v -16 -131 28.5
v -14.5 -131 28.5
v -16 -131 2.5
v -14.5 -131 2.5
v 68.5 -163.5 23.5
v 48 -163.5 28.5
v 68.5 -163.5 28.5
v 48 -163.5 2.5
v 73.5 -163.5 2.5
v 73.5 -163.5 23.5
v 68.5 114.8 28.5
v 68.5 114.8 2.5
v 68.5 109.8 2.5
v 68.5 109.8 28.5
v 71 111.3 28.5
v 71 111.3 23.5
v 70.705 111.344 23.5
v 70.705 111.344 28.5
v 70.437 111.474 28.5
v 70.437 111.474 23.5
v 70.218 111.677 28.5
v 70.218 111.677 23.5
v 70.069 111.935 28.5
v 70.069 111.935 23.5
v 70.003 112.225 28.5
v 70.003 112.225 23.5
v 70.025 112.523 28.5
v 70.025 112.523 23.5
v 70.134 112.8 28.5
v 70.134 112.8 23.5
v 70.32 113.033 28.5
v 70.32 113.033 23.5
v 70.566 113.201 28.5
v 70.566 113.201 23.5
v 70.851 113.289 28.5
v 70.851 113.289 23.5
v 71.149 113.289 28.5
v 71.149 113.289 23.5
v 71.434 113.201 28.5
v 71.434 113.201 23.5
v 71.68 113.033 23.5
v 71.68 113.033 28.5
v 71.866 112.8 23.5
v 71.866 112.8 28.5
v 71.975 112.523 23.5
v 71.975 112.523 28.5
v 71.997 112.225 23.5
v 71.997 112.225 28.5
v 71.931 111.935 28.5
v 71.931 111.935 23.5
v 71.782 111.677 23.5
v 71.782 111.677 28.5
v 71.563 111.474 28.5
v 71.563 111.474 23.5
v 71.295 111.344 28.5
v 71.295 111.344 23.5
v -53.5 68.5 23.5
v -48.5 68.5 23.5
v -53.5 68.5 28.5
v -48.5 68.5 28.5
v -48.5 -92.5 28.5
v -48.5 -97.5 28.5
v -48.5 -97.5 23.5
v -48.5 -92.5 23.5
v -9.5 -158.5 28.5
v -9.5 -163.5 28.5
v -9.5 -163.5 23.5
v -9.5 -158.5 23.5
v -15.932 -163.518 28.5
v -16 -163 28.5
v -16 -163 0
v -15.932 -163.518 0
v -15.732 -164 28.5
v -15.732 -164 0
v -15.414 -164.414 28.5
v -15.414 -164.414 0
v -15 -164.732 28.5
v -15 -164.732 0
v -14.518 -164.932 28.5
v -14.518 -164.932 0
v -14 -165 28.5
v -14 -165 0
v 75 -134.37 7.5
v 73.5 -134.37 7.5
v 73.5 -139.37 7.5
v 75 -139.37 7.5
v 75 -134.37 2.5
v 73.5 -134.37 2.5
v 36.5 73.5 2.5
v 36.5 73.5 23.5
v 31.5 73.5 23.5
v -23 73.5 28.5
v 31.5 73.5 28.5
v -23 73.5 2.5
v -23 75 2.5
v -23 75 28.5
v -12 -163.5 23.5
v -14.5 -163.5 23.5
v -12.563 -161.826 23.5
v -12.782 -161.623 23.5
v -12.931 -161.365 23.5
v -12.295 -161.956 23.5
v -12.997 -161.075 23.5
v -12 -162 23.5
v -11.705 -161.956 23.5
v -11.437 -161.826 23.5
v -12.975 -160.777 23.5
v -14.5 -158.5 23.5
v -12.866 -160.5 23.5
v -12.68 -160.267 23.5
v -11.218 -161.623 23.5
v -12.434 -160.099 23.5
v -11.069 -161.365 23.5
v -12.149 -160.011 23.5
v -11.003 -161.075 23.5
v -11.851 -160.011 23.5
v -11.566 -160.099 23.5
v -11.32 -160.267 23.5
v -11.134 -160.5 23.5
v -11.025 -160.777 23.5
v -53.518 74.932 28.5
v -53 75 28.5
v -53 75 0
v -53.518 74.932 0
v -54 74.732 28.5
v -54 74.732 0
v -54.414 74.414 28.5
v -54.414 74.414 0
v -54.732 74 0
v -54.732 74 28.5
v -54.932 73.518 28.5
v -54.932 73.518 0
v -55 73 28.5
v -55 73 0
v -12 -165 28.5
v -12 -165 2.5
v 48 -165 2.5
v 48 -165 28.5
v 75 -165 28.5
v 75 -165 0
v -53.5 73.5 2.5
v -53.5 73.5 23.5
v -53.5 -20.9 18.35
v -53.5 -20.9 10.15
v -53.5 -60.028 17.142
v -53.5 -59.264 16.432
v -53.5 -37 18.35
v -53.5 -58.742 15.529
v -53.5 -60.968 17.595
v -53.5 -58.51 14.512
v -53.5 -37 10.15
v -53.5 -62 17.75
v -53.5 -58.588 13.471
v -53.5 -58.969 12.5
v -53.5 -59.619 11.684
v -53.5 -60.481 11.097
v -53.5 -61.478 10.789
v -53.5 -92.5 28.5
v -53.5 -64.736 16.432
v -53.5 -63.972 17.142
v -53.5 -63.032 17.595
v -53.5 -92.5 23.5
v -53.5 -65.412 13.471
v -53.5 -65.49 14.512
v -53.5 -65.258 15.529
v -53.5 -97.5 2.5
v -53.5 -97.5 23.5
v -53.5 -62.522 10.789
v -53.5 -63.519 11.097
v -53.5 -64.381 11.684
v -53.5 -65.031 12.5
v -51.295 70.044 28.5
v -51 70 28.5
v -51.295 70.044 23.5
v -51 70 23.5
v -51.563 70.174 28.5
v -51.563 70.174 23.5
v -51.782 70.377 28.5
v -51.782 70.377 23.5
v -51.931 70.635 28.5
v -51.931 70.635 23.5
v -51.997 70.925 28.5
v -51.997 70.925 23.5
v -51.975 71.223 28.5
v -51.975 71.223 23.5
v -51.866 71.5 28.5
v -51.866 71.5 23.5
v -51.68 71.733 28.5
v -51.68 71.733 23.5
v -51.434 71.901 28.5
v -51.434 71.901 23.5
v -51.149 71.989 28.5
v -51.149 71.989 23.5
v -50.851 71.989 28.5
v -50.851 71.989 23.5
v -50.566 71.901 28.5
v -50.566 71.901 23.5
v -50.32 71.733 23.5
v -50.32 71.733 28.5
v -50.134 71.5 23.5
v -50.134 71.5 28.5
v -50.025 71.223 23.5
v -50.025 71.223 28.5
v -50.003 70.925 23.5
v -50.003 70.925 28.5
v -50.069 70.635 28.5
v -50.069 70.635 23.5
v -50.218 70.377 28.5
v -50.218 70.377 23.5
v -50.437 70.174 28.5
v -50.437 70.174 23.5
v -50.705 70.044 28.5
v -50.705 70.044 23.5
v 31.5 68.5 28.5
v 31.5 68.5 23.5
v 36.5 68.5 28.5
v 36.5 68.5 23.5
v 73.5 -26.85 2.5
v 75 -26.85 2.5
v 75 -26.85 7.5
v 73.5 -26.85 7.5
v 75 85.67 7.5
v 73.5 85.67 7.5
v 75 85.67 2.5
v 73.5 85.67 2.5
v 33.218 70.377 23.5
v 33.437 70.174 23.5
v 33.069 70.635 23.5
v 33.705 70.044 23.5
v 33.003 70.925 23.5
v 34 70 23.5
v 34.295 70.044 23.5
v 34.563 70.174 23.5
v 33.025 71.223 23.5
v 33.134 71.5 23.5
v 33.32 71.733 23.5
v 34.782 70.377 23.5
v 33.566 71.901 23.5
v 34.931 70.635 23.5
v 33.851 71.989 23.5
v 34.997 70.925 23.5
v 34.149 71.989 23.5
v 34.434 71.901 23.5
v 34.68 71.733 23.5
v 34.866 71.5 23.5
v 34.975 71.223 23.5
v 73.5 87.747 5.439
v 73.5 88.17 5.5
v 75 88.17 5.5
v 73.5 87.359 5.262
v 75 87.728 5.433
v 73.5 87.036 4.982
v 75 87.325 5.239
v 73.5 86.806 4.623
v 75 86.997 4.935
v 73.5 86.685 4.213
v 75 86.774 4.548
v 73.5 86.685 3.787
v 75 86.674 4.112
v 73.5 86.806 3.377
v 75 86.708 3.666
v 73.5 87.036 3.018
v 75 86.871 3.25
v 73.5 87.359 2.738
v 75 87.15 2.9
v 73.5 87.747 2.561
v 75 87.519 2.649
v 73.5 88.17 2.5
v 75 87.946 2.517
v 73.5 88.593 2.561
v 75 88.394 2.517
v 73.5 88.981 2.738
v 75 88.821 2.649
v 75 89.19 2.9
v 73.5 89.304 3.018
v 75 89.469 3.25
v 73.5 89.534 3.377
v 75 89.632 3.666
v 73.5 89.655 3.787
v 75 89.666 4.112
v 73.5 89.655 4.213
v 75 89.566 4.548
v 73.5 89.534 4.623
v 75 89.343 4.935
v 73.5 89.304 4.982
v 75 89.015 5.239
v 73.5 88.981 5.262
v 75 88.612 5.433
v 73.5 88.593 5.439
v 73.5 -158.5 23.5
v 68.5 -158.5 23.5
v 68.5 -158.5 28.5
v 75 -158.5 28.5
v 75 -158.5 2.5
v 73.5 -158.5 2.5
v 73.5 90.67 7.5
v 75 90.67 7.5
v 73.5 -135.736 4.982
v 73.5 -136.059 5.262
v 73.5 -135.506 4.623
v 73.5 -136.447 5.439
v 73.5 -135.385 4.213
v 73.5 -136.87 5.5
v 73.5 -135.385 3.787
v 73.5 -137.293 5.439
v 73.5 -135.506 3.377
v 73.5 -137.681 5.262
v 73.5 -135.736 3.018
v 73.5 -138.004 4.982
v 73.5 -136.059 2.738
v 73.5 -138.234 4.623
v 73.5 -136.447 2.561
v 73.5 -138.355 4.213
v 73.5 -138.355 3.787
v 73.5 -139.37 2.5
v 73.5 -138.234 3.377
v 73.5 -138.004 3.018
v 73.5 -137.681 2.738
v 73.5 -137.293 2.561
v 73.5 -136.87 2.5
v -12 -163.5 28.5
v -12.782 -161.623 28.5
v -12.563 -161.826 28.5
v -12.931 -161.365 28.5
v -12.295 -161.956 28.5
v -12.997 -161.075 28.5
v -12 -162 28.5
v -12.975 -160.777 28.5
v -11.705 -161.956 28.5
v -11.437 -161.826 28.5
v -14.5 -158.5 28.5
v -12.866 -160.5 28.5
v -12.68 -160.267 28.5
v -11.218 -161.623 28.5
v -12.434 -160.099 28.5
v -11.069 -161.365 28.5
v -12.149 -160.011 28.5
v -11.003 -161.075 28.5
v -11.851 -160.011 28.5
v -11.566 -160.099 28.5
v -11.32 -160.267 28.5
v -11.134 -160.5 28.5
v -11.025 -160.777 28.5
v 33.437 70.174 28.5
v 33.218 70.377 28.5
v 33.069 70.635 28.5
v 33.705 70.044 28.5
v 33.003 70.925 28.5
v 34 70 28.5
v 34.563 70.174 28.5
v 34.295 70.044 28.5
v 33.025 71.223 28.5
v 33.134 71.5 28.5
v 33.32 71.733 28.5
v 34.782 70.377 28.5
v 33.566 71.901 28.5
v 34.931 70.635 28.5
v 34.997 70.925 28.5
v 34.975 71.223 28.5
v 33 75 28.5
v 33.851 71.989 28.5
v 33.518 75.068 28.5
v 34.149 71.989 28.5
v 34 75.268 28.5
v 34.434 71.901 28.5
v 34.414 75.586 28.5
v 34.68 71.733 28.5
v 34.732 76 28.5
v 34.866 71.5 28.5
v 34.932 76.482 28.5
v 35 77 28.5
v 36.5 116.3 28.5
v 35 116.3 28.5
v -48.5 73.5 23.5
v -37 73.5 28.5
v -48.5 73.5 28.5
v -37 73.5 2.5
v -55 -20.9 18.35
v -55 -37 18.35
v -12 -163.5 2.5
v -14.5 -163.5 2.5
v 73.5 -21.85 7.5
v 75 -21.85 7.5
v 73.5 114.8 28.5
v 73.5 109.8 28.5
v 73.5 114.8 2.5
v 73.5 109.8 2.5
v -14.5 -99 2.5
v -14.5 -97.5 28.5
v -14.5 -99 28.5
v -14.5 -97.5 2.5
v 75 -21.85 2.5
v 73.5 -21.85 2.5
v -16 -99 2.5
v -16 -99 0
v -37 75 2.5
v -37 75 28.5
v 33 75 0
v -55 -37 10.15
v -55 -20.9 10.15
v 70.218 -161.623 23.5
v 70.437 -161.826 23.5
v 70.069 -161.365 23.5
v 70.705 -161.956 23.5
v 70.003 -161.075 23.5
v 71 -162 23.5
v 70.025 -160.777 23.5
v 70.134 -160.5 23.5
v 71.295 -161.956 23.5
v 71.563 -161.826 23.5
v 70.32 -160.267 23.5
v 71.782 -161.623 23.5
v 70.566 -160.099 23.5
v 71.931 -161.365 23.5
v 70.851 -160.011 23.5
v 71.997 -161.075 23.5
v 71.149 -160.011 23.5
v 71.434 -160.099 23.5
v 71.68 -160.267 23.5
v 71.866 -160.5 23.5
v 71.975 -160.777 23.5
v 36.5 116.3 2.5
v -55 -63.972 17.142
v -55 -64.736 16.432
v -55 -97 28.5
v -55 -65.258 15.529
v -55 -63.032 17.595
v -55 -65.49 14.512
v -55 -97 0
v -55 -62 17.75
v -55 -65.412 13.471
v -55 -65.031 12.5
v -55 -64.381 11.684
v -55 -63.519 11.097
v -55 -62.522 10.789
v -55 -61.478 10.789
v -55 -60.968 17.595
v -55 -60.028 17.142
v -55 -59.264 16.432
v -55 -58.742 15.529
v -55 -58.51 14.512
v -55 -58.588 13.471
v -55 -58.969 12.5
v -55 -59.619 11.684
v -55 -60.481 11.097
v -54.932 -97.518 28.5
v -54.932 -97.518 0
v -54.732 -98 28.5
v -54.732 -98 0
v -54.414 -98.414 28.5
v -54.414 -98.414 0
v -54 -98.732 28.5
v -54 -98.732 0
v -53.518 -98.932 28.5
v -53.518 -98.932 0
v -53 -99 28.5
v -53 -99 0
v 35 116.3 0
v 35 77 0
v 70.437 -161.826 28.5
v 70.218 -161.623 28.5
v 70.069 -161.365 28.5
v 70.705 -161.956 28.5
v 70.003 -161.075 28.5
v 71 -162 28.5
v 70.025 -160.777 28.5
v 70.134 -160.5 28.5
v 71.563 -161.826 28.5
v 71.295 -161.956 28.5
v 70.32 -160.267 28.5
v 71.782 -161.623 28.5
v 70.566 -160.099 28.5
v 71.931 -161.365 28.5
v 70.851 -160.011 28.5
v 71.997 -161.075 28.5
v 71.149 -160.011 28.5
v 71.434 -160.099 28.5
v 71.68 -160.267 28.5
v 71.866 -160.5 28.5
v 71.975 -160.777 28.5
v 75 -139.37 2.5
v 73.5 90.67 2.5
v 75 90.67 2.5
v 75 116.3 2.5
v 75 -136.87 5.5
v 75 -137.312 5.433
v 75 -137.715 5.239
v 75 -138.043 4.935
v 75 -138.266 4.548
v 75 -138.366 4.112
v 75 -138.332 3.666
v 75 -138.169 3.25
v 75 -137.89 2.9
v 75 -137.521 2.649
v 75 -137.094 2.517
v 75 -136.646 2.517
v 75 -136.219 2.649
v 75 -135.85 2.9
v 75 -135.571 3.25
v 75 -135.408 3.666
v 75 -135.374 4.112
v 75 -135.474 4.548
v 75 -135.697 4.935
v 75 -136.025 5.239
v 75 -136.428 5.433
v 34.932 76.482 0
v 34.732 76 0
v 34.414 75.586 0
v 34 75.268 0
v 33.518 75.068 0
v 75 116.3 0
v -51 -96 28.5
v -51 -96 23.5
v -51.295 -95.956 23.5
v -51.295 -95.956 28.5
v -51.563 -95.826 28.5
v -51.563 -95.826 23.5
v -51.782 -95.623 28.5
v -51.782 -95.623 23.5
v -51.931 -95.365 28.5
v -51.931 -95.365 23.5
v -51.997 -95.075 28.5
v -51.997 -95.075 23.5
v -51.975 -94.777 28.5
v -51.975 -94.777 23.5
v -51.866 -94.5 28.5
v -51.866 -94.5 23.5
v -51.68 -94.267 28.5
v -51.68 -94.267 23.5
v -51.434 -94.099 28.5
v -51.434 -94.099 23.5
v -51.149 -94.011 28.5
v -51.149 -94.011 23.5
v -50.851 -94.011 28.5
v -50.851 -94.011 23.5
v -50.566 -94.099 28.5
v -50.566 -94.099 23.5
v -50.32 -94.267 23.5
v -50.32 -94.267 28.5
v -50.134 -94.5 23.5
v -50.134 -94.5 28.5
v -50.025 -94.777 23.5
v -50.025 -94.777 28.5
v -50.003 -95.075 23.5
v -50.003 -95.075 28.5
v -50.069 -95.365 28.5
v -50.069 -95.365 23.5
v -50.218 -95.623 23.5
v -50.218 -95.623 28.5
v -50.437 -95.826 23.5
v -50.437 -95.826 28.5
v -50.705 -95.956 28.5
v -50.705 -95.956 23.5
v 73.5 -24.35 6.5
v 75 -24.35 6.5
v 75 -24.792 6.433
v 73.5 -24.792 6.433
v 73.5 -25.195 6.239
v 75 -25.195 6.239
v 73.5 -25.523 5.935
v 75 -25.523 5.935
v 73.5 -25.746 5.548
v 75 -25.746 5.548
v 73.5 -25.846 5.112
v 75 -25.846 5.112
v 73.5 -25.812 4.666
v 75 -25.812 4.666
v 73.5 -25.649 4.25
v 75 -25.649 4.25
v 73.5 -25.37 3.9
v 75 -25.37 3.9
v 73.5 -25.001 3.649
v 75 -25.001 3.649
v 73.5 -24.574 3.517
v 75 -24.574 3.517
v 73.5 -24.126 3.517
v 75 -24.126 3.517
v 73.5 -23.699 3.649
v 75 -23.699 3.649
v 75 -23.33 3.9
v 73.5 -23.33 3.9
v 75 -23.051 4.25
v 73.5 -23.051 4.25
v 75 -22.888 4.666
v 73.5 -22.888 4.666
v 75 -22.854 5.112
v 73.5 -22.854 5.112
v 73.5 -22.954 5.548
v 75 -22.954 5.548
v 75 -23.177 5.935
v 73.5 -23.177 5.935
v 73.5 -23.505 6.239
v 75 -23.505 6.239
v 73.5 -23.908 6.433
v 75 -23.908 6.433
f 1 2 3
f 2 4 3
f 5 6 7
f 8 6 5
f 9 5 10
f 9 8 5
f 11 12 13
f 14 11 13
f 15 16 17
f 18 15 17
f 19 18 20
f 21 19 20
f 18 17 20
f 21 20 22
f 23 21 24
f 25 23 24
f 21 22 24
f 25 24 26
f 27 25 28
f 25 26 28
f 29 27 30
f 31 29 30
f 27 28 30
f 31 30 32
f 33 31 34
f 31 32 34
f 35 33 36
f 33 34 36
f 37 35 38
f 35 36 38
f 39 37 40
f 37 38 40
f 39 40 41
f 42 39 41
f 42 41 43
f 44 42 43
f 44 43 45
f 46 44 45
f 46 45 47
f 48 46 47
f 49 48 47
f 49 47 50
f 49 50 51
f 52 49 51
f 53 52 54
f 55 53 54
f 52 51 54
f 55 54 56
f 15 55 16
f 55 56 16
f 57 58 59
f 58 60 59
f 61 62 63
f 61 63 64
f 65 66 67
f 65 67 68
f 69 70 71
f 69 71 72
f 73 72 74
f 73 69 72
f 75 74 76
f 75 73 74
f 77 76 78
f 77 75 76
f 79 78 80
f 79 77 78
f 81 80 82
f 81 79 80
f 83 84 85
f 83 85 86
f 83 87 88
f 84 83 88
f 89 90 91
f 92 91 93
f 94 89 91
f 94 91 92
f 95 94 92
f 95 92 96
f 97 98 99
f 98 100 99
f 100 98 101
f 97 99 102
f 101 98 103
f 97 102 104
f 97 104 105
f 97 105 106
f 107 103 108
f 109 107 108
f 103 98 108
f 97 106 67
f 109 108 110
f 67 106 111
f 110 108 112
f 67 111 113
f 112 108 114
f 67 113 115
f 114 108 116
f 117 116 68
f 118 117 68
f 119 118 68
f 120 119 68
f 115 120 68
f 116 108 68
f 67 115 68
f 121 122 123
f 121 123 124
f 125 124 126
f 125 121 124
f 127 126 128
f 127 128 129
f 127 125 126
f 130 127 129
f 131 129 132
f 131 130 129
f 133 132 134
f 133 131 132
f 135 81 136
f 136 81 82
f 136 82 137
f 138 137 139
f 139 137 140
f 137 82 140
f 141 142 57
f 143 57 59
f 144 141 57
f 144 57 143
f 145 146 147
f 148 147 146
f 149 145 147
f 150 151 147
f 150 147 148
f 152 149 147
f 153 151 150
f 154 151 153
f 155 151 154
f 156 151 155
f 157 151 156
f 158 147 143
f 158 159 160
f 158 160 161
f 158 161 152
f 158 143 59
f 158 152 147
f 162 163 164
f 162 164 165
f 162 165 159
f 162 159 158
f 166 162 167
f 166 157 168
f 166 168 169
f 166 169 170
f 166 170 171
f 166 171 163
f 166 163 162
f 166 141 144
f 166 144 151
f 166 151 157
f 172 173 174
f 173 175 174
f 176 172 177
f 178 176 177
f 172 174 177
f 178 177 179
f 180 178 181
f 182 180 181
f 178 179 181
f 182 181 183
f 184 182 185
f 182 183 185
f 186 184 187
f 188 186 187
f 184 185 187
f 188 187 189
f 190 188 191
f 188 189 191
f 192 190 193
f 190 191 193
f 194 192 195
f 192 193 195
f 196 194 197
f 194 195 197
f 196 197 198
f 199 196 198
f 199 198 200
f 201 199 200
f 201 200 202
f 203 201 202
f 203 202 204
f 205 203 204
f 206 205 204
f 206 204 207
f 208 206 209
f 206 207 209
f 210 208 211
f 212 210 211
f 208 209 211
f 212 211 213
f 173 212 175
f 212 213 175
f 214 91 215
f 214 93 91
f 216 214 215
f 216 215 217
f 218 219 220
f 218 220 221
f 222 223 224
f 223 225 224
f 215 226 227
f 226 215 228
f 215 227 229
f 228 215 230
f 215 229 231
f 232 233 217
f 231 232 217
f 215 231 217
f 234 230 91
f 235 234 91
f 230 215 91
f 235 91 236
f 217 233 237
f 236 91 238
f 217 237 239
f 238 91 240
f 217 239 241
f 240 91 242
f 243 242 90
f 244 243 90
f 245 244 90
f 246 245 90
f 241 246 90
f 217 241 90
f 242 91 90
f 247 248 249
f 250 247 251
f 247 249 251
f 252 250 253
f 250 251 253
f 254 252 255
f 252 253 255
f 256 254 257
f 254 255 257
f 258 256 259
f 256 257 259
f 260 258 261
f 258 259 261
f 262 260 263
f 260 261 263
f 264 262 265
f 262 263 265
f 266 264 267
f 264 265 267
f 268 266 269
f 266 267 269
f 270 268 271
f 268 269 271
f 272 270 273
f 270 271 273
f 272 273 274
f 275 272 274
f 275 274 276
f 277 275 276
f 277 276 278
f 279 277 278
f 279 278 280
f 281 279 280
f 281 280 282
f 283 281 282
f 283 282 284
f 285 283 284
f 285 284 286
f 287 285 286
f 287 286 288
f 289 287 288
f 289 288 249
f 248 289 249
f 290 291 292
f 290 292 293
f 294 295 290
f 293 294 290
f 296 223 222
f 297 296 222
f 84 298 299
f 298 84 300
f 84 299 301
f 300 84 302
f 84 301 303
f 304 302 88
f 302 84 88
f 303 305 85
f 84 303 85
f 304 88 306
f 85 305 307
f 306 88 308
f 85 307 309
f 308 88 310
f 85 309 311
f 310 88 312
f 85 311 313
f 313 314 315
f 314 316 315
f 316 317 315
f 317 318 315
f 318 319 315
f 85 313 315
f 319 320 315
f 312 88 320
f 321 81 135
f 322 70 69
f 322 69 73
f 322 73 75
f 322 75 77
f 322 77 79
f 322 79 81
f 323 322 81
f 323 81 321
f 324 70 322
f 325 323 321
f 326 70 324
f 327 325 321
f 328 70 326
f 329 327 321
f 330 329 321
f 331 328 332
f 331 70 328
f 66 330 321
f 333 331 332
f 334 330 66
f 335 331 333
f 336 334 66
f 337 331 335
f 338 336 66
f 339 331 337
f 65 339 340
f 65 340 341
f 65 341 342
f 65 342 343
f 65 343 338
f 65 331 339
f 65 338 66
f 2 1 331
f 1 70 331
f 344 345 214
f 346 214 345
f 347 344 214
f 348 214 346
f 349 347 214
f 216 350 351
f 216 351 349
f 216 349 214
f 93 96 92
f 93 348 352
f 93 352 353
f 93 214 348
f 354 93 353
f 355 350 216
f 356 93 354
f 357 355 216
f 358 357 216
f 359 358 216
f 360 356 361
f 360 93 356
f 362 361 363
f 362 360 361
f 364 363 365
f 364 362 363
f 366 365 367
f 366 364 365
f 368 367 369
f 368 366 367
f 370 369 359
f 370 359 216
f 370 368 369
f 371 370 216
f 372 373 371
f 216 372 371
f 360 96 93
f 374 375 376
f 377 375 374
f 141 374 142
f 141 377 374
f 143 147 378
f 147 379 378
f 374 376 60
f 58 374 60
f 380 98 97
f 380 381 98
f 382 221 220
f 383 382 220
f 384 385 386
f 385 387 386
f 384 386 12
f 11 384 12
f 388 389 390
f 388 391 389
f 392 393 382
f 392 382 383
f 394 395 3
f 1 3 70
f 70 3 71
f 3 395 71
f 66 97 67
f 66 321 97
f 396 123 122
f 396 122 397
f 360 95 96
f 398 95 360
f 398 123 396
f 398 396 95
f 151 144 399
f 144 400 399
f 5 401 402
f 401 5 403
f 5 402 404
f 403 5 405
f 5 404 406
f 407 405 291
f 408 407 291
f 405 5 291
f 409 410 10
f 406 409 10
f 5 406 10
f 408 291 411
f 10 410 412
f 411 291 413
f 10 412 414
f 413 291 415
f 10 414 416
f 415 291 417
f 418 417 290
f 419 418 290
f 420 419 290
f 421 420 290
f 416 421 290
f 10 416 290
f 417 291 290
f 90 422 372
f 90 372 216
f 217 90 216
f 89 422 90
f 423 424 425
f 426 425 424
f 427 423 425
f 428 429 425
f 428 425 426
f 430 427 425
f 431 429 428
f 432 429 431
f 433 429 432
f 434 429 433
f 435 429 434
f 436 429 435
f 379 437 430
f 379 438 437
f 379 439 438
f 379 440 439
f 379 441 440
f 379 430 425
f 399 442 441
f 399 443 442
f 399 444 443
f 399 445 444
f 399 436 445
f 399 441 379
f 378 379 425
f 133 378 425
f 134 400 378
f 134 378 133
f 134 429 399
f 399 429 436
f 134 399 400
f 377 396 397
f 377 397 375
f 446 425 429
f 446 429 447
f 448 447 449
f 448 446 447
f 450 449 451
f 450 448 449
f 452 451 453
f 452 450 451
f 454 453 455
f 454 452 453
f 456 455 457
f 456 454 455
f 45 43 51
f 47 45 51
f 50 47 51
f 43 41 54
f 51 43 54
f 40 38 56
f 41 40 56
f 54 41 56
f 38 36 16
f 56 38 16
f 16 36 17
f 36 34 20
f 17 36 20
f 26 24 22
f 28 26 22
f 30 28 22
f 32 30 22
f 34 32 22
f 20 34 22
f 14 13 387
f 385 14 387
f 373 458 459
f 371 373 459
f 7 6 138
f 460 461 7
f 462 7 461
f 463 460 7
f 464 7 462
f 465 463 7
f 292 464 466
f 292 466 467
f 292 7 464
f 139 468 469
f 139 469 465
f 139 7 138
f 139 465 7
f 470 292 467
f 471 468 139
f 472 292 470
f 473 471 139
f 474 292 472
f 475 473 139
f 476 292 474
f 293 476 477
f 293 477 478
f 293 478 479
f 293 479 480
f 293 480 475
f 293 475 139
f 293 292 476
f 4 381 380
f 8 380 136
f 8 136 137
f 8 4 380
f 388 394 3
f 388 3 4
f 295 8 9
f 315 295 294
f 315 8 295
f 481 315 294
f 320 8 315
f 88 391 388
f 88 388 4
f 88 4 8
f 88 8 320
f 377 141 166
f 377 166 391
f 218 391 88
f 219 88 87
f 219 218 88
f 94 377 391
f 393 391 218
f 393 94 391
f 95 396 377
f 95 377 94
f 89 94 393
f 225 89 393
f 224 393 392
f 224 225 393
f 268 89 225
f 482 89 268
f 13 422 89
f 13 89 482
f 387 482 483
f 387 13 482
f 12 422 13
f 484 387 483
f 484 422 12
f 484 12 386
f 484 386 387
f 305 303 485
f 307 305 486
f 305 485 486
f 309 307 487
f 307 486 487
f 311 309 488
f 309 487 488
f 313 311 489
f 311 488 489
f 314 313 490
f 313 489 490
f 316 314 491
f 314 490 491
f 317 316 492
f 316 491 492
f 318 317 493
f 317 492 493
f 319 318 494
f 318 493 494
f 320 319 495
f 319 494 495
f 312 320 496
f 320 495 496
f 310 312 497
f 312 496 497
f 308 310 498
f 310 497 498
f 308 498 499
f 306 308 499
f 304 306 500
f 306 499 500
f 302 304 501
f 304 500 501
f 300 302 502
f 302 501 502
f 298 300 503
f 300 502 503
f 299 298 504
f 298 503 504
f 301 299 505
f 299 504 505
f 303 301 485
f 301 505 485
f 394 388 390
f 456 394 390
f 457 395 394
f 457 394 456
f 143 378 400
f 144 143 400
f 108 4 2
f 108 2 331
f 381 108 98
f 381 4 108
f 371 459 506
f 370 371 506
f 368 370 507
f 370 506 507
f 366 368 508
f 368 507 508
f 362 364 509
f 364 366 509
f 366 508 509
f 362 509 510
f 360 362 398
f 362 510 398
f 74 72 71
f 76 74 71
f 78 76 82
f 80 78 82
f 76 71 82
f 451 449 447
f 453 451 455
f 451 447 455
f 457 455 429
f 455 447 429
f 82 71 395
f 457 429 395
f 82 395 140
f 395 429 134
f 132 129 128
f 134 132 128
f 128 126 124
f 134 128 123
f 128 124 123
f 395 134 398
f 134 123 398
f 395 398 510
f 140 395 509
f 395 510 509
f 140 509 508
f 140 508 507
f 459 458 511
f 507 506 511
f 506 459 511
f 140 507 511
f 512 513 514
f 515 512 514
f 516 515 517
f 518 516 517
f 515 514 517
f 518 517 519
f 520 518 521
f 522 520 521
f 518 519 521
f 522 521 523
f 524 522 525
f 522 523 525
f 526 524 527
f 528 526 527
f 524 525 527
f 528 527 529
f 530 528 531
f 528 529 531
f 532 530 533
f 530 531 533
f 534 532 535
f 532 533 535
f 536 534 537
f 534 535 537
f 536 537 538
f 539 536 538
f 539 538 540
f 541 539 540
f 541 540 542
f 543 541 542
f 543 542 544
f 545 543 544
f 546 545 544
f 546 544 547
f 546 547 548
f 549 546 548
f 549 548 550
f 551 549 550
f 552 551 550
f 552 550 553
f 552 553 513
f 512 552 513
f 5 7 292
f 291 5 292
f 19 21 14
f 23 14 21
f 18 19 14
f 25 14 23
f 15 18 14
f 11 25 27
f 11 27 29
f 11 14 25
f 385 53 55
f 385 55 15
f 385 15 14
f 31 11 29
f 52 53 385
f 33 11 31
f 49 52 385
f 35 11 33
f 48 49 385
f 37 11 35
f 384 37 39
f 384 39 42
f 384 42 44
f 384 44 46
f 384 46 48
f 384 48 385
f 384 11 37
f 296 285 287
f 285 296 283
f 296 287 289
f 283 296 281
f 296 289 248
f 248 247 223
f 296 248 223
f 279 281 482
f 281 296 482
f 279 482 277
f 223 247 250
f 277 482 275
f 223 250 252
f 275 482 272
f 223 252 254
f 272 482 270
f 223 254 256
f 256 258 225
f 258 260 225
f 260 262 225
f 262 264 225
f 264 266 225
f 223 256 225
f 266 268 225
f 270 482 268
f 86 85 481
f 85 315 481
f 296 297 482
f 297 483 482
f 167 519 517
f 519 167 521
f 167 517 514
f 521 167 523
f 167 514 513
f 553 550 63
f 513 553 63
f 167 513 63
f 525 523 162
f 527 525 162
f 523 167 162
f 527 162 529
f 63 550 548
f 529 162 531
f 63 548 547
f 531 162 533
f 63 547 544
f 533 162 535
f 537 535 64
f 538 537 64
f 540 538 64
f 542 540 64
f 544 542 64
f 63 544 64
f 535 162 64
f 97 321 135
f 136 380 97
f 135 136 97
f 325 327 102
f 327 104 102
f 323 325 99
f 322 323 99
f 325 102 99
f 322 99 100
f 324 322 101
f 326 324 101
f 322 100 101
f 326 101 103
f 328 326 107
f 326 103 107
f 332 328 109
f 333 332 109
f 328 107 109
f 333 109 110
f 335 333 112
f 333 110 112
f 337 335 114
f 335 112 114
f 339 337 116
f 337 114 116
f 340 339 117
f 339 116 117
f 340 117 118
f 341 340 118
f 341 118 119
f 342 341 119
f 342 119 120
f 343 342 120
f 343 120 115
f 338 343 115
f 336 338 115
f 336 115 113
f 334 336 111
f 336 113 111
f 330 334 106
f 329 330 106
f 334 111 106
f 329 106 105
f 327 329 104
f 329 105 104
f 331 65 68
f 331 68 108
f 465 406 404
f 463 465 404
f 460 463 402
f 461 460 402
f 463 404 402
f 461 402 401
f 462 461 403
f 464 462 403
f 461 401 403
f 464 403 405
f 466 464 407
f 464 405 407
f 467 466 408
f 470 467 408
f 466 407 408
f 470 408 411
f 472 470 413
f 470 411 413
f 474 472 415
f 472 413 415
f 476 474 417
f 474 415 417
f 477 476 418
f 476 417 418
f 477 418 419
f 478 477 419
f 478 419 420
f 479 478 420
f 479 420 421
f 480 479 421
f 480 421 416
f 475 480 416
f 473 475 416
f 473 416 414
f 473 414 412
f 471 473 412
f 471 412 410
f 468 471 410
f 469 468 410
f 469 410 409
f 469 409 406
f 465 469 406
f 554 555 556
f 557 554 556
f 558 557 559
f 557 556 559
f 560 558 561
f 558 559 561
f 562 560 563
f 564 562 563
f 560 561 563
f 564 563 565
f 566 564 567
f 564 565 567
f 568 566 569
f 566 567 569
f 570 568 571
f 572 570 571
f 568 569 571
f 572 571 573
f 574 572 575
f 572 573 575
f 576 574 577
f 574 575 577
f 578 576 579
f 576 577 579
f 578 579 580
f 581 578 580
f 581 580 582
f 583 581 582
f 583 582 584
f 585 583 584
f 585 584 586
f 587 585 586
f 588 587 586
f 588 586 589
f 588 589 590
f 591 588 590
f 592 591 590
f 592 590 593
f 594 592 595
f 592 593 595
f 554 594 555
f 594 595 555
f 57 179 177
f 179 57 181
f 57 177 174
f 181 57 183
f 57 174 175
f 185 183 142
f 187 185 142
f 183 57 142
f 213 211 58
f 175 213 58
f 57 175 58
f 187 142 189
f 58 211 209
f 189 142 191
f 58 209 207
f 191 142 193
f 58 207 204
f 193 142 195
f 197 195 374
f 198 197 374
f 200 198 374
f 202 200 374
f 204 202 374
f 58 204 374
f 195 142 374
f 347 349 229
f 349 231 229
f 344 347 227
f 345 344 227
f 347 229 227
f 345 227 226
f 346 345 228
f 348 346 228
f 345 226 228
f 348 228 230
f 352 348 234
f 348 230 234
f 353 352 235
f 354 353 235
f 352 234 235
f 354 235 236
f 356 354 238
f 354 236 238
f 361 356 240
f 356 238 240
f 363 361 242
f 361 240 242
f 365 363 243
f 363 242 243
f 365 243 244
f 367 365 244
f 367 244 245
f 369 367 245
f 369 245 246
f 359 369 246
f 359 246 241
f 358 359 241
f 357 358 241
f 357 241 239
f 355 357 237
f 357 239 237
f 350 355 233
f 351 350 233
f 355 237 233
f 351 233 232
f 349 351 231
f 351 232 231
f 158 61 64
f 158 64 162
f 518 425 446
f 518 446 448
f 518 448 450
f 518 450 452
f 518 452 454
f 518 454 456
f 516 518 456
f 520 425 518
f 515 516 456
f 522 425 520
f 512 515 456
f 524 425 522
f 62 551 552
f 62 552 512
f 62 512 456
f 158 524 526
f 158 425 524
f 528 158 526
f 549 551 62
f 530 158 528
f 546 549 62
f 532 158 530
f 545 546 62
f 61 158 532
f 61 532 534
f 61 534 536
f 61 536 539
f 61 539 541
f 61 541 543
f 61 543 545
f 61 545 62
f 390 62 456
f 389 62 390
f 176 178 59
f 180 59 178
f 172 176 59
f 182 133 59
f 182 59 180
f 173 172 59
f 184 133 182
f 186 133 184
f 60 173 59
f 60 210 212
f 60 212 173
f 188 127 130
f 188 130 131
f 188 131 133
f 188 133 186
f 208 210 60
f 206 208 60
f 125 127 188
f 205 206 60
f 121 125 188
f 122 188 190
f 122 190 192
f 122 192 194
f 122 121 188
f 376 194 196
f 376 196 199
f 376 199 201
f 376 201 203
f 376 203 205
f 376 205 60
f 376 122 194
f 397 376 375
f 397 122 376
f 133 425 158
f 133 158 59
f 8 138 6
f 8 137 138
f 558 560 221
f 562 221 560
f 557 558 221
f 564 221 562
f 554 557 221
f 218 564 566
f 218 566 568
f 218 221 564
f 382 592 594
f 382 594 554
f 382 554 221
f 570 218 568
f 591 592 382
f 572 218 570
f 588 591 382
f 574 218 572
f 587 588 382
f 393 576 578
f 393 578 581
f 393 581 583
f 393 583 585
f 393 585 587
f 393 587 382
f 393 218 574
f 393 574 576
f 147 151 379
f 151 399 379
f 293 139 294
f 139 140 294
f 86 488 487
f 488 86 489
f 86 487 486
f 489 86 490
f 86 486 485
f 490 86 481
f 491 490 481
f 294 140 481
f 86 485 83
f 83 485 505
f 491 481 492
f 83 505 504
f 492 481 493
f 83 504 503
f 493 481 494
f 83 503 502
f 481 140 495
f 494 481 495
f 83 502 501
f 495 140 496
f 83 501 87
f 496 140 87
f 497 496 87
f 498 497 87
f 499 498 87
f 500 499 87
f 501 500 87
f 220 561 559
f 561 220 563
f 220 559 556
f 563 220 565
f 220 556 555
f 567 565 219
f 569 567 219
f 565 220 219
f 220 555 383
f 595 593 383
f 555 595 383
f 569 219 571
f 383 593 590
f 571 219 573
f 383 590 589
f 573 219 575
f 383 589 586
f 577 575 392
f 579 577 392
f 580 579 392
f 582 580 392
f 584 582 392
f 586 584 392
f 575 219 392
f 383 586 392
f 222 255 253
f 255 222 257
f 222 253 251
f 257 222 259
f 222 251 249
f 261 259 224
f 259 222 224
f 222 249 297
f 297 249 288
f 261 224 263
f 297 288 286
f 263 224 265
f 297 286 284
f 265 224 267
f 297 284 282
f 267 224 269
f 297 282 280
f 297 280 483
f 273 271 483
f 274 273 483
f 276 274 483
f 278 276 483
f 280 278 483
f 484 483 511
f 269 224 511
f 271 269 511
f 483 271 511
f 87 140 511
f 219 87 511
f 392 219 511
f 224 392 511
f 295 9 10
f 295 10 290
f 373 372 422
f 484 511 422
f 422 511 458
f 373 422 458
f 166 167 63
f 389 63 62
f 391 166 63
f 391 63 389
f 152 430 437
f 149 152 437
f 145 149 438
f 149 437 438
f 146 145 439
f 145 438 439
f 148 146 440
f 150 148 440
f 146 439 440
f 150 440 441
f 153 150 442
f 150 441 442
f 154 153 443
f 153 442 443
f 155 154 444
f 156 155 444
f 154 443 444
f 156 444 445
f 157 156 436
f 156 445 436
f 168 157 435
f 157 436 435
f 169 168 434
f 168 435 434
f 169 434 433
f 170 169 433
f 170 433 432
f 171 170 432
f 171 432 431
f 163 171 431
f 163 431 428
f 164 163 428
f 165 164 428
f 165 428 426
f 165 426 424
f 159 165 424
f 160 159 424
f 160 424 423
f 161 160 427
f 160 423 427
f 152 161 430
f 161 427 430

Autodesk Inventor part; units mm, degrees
ref_plane "YZ Plane" through (0, 0, 0) normal (1, 0, 0) x (0, 1, 0)
ref_plane "XZ Plane" through (0, 0, 0) normal (0, 1, 0) x (-1, 0, 0)
ref_plane "XY Plane" through (0, 0, 0) normal (0, 0, 1) x (1, 0, 0)
sketch "Skizze1" plane through (0, 0, 0) normal (0, 0, 1) x (1, 0, 0)
  line L0 (-55, 75) -> (55, 75)
  line L1 (55, 75) -> (55, -75)
  line L2 (55, -75) -> (-55, -75) construction
  line L3 (-55, -75) -> (-55, 75)
  line L4 (0, -221.26) -> (0, 172.56) construction
  line L5 (-81, 0) -> (101, 0) construction
  line L6 (55, -75) -> (-16, -75) construction
  line L7 (-16, -75) -> (-16, -165) construction
  line L8 (-16, -165) -> (55, -165)
  line L9 (55, -165) -> (55, -75)
  line L10 (55, -165) -> (75, -165)
  line L11 (75, -165) -> (75, 116.3)
  line L12 (75, 116.3) -> (55, 116.3)
  line L13 (55, 116.3) -> (55, -165) construction
  line L14 (-55, -75) -> (-16, -75) construction
  line L15 (-16, -75) -> (-16, -99) construction
  line L16 (-16, -99) -> (-55, -99)
  line L17 (-55, -99) -> (-55, -75)
  line L18 (-16, -99) -> (-16, -165)
  line L19 (55, 116.3) -> (35, 116.3)
  line L20 (35, 116.3) -> (35, 75)
  line L21 (35, 75) -> (55, 75)
  line L22 (55, 75) -> (55, 116.3) construction
  point P0 (0, 0)
  point P1 (-35.5, -75)
  dimension "d0" = 110
  dimension "d1" = 150
  dimension "d4" = 90
  dimension "d5" = 71
  dimension "d6" = 281.3
  dimension "d7" = 20
  dimension "d139" = 24
  dimension "d140" = 20
extrude "Extrusion1" add sketch "Skizze1" along normal blind 2.5
sketch "Skizze7" plane through (0, 0, 2.5) normal (0, 0, 1) x (1, 0, 0)
  line L0 (75, 116.3) -> (35, 116.3) projected
  line L1 (75, 116.3) -> (73.5, 116.3)
  line L2 (73.5, 116.3) -> (73.5, -165) construction
  line L3 (73.5, -165) -> (75, -165)
  line L4 (75, -165) -> (75, 116.3)
  line L5 (75, 90.67) -> (73.5, 90.67)
  line L6 (73.5, 90.67) -> (73.5, 85.67)
  line L7 (73.5, 85.67) -> (75, 85.67)
  line L8 (75, 85.67) -> (75, 90.67)
  line L9 (75, -134.37) -> (73.5, -134.37)
  line L10 (73.5, -134.37) -> (73.5, -139.37)
  line L11 (73.5, -139.37) -> (75, -139.37)
  line L12 (75, -139.37) -> (75, -134.37)
  line L13 (-16, -165) -> (75, -165) projected
  line L14 (75, -165) -> (75, 116.3) projected
  line L15 (75, -26.85) -> (73.5, -26.85)
  line L16 (73.5, -26.85) -> (73.5, -21.85)
  line L17 (73.5, -21.85) -> (75, -21.85)
  line L18 (75, -21.85) -> (75, -26.85)
  point P0 (0, 0)
  point P1 (45.75, 136.3)
  point P2 (-15.25, -145)
  point P3 (75, 85.67)
  point P4 (49.25, 116.3)
  point P5 (74.25, -165)
  point P6 (75, -26.85)
  point P7 (75, -21.85)
  dimension "d66" = 1.5
  dimension "d67" = 5
  dimension "d68" = 25.63
  dimension "d69" = 25.63
  dimension "d70" = 5
  dimension "d156" = 5
  dimension "d157" = 138.15
extrude "Extrusion6" add sketch "Skizze7" along normal blind 5
sketch "Skizze8" plane through (73.5, -139.37, 2.5) normal (-1, 0, 0) x (0, 0, 1)
  line L0 (0, 0) -> (5, 0) projected
  line L1 (5, 5) -> (5, 0) projected
  line L2 (0, 225.04) -> (5, 225.04) projected
  line L3 (5, 230.04) -> (5, 225.04) projected
  line L4 (0, 230.04) -> (5, 230.04) projected
  line L5 (0, 225.04) -> (0, 230.04) projected
  line L6 (5, 112.52) -> (5, 117.52) projected
  line L7 (0, 112.52) -> (5, 112.52) projected
  point P0 (-2.5, 139.37)
  point P1 (1.5, 2.5)
  point P2 (2.5, 0)
  point P3 (1.5, 227.54)
  point P4 (2.5, 115.02)
  dimension "d73" = 2.5
  dimension "d74" = 3.5
  dimension "d75" = 3.5
  dimension "d76" = 2.5
  dimension "d158" = 2.5
  dimension "d159" = 2.5
hole "Bohrung1" at (73.5, 88.17, 4) at (73.5, -136.87, 4) at (73.5, -24.35, 5) direction (1, 0, 0) diameter 3 depth 1.5
sketch "Skizze15" plane through (0, 0, 2.5) normal (0, 0, 1) x (1, 0, 0)
  line L0 (73.5, -134.37) -> (75, -134.37) projected
  line L1 (75, -134.37) -> (75, -26.85) projected
  line L2 (75, 85.67) -> (73.5, 85.67) projected
  line L3 (73.5, 85.67) -> (73.5, 88.17) projected
  line L4 (73.5, 88.17) -> (73.5, 90.67) projected
  line L5 (73.5, 90.67) -> (75, 90.67) projected
  line L6 (75, 90.67) -> (75, 116.3) projected
  line L7 (75, 116.3) -> (35, 116.3) projected
  line L8 (35, 116.3) -> (35, 75) projected
  line L9 (35, 75) -> (-55, 75) projected
  line L10 (-55, 75) -> (-55, -99) projected
  line L11 (-55, -99) -> (-16, -99) projected
  line L12 (-16, -99) -> (-16, -165) projected
  line L13 (-16, -165) -> (75, -165) projected
  line L14 (75, -165) -> (75, -139.37) projected
  line L15 (75, -139.37) -> (73.5, -139.37) projected
  line L16 (73.5, -139.37) -> (73.5, -136.87) projected
  line L17 (73.5, -136.87) -> (73.5, -134.37) projected
  line L18 (75, 116.3) -> (35, 116.3) projected
  line L19 (36.5, 116.3) -> (36.5, 73.5)
  line L20 (36.5, 73.5) -> (-23, 73.5)
  line L21 (-23, 73.5) -> (-23, 75)
  line L22 (-37, 75) -> (-37, 73.5)
  line L23 (-37, 73.5) -> (-53.5, 73.5)
  line L24 (-53.5, 73.5) -> (-53.5, -97.5)
  line L25 (-53.5, -97.5) -> (-14.5, -97.5)
  line L26 (-14.5, -97.5) -> (-14.5, -99)
  line L27 (-14.5, -99) -> (-16, -99)
  line L28 (-14.5, -131) -> (-14.5, -163.5)
  line L29 (-14.5, -163.5) -> (-12, -163.5)
  line L30 (-12, -163.5) -> (-12, -165)
  line L31 (48, -165) -> (48, -163.5)
  line L32 (48, -163.5) -> (75, -163.5)
  line L33 (-14.5, -131) -> (-16, -131)
  line L34 (75, -26.85) -> (73.5, -26.85) projected
  line L35 (73.5, -26.85) -> (73.5, -21.85) projected
  line L36 (73.5, -21.85) -> (75, -21.85) projected
  line L37 (75, -21.85) -> (75, 85.67) projected
  line L38 (75, 111.3) -> (75, 116.3)
  line L39 (75, -163.5) -> (73.5, -163.5)
  line L40 (73.5, -163.5) -> (73.5, -158.5)
  line L41 (73.5, -158.5) -> (75, -158.5)
  line L42 (75, -158.5) -> (75, -163.5)
  line L43 (73.5, 114.8) -> (68.5, 114.8)
  line L44 (68.5, 114.8) -> (68.5, 109.8)
  line L45 (68.5, 109.8) -> (73.5, 109.8)
  line L46 (73.5, 109.8) -> (73.5, 114.8)
  point P0 (0, 0)
  point P1 (75, -158.5)
  dimension "d141" = 1.5
  dimension "d142" = 1.5
  dimension "d143" = 1.5
  dimension "d144" = 1.5
  dimension "d145" = 1.5
  dimension "d146" = 1.5
  dimension "d147" = 4
  dimension "d148" = 64
  dimension "d149" = 0
  dimension "d150" = 32
  dimension "d151" = 18
  dimension "d152" = 14
  dimension "d171" = 5
  dimension "d172" = 1.5
  dimension "d224" = 5
  dimension "d225" = 5
  dimension "d226" = 1.5
  dimension "d227" = 1.5
extrude "Extrusion13" add sketch "Skizze15" along normal blind 26 contours L14 L32 L40 L41 | L14 L13 L31 L32 | L13 L12 L33 L28 L29 L30 | L11 L10 L9 L22 L23 L24 L25 L26 L27 | L19 L20 L21 L9 L8 L7 | L46 L45 L44 L43
fillet "Rundung1" radius 2 4 edges at (35, 75, 14.25) (-55, 75, 14.25) (-55, -99, 14.25) (-16, -165, 14.25)
sketch "Skizze16" plane through (-55, -97, 0) normal (-1, 0, 0) x (0, 0, 1)
  line L0 (18.35, 76.1) -> (10.15, 76.1)
  line L1 (10.15, 76.1) -> (10.15, 60)
  line L2 (10.15, 60) -> (18.35, 60)
  line L3 (18.35, 60) -> (18.35, 76.1)
  circle A0 centre (14.25, 35) radius 3.5
  line L4 (0, 170) -> (28.5, 170) projected
  line L5 (0, 170) -> (0, 0) projected
  line L6 (28.5, 0) -> (0, 0) projected
  line L7 (28.5, 170) -> (28.5, 0) projected
  point P0 (0, 97)
  dimension "d160" = 16.1
  dimension "d161" = 8.2
  dimension "d162" = 7
  dimension "d163" = 14.25
  dimension "d164" = 35
  dimension "d165" = 60
  dimension "d166" = 10.15
extrude "Extrusion14" cut sketch "Skizze16" against normal up to surface (1.5 mm away) contours L3 L2 L1 L0 | A0
sketch "Skizze17" plane through (0, 0, 28.5) normal (0, 0, 1) x (1, 0, 0)
  line L0 (73.5, -163.5) -> (48, -163.5) projected
  line L1 (73.5, -163.5) -> (68.5, -163.5)
  line L2 (68.5, -163.5) -> (68.5, -158.5)
  line L3 (68.5, -158.5) -> (73.5, -158.5)
  line L4 (73.5, -158.5) -> (73.5, -163.5)
  line L5 (-14.5, -131) -> (-14.5, -163.5) projected
  line L6 (-14.5, -163.5) -> (-9.5, -163.5)
  line L7 (-9.5, -163.5) -> (-9.5, -158.5)
  line L8 (-9.5, -158.5) -> (-14.5, -158.5)
  line L9 (-14.5, -158.5) -> (-14.5, -163.5)
  line L10 (-53.5, 73.5) -> (-53.5, -97.5) projected
  line L11 (-53.5, -97.5) -> (-48.5, -97.5)
  line L12 (-48.5, -97.5) -> (-48.5, -92.5)
  line L13 (-48.5, -92.5) -> (-53.5, -92.5)
  line L14 (-53.5, -92.5) -> (-53.5, -97.5)
  line L15 (-53.5, 73.5) -> (-48.5, 73.5)
  line L16 (-48.5, 73.5) -> (-48.5, 68.5)
  line L17 (-48.5, 68.5) -> (-53.5, 68.5)
  line L18 (-53.5, 68.5) -> (-53.5, 73.5)
  line L19 (36.5, 73.5) -> (36.5, 116.3) projected
  line L20 (36.5, 73.5) -> (31.5, 73.5)
  line L21 (31.5, 73.5) -> (31.5, 68.5)
  line L22 (31.5, 68.5) -> (36.5, 68.5)
  line L23 (36.5, 68.5) -> (36.5, 73.5)
  point P0 (0, 0)
  point P1 (-14.5, -158.5)
  dimension "d173" = 5
  dimension "d174" = 5
  dimension "d175" = 5
  dimension "d176" = 5
  dimension "d177" = 5
  dimension "d178" = 5
  dimension "d179" = 5
  dimension "d180" = 5
  dimension "d181" = 5
  dimension "d182" = 5
extrude "Extrusion15" add sketch "Skizze17" against normal blind 5
sketch "Skizze19" plane through (0, 0, 28.5) normal (0, 0, 1) x (1, 0, 0)
  line L0 (-14, -165) -> (75, -165) projected
  line L1 (75, -165) -> (75, -158.5) projected
  line L2 (-12, -165) -> (48, -165) projected
  line L3 (-16, -131) -> (-16, -163) projected
  line L4 (-53, -99) -> (-14.5, -99) projected
  line L5 (-55, 73) -> (-55, -97) projected
  line L6 (33, 75) -> (-53, 75) projected
  line L7 (33, 75) -> (-53, 75) projected
  line L8 (31.5, 73.5) -> (31.5, 68.5) projected
  line L9 (36.5, 116.3) -> (35, 116.3) projected
  line L10 (75, 90.67) -> (75, 116.3) projected
  point P0 (0, 0)
  point P1 (71, -161)
  point P2 (-12, -161)
  point P3 (-51, -95)
  point P4 (-51, 71)
  point P5 (34, 71)
  point P6 (71, 112.3)
  point P7 (-16, -163)
  point P8 (-37, 75)
  point P9 (-23, 75)
  point P10 (69.25, -139.37)
  point P11 (-21.75, -99)
  dimension "d205" = 4
  dimension "d206" = 4
  dimension "d207" = 4
  dimension "d208" = 4
  dimension "d209" = 4
  dimension "d210" = 4
  dimension "d211" = 4
  dimension "d212" = 4
  dimension "d213" = 4
  dimension "d214" = 2.5
  dimension "d215" = 4
  dimension "d228" = 4
hole "Bohrung3" at (71, -161, 28.5) at (-12, -161, 28.5) at (-51, -95, 28.5) at (71, 112.3, 28.5) at (34, 71, 28.5) at (-51, 71, 28.5) direction (0, 0, -1) diameter 2 depth 5
properties part number "PCB_Grundplatte_Platinengehäuse_V2"
